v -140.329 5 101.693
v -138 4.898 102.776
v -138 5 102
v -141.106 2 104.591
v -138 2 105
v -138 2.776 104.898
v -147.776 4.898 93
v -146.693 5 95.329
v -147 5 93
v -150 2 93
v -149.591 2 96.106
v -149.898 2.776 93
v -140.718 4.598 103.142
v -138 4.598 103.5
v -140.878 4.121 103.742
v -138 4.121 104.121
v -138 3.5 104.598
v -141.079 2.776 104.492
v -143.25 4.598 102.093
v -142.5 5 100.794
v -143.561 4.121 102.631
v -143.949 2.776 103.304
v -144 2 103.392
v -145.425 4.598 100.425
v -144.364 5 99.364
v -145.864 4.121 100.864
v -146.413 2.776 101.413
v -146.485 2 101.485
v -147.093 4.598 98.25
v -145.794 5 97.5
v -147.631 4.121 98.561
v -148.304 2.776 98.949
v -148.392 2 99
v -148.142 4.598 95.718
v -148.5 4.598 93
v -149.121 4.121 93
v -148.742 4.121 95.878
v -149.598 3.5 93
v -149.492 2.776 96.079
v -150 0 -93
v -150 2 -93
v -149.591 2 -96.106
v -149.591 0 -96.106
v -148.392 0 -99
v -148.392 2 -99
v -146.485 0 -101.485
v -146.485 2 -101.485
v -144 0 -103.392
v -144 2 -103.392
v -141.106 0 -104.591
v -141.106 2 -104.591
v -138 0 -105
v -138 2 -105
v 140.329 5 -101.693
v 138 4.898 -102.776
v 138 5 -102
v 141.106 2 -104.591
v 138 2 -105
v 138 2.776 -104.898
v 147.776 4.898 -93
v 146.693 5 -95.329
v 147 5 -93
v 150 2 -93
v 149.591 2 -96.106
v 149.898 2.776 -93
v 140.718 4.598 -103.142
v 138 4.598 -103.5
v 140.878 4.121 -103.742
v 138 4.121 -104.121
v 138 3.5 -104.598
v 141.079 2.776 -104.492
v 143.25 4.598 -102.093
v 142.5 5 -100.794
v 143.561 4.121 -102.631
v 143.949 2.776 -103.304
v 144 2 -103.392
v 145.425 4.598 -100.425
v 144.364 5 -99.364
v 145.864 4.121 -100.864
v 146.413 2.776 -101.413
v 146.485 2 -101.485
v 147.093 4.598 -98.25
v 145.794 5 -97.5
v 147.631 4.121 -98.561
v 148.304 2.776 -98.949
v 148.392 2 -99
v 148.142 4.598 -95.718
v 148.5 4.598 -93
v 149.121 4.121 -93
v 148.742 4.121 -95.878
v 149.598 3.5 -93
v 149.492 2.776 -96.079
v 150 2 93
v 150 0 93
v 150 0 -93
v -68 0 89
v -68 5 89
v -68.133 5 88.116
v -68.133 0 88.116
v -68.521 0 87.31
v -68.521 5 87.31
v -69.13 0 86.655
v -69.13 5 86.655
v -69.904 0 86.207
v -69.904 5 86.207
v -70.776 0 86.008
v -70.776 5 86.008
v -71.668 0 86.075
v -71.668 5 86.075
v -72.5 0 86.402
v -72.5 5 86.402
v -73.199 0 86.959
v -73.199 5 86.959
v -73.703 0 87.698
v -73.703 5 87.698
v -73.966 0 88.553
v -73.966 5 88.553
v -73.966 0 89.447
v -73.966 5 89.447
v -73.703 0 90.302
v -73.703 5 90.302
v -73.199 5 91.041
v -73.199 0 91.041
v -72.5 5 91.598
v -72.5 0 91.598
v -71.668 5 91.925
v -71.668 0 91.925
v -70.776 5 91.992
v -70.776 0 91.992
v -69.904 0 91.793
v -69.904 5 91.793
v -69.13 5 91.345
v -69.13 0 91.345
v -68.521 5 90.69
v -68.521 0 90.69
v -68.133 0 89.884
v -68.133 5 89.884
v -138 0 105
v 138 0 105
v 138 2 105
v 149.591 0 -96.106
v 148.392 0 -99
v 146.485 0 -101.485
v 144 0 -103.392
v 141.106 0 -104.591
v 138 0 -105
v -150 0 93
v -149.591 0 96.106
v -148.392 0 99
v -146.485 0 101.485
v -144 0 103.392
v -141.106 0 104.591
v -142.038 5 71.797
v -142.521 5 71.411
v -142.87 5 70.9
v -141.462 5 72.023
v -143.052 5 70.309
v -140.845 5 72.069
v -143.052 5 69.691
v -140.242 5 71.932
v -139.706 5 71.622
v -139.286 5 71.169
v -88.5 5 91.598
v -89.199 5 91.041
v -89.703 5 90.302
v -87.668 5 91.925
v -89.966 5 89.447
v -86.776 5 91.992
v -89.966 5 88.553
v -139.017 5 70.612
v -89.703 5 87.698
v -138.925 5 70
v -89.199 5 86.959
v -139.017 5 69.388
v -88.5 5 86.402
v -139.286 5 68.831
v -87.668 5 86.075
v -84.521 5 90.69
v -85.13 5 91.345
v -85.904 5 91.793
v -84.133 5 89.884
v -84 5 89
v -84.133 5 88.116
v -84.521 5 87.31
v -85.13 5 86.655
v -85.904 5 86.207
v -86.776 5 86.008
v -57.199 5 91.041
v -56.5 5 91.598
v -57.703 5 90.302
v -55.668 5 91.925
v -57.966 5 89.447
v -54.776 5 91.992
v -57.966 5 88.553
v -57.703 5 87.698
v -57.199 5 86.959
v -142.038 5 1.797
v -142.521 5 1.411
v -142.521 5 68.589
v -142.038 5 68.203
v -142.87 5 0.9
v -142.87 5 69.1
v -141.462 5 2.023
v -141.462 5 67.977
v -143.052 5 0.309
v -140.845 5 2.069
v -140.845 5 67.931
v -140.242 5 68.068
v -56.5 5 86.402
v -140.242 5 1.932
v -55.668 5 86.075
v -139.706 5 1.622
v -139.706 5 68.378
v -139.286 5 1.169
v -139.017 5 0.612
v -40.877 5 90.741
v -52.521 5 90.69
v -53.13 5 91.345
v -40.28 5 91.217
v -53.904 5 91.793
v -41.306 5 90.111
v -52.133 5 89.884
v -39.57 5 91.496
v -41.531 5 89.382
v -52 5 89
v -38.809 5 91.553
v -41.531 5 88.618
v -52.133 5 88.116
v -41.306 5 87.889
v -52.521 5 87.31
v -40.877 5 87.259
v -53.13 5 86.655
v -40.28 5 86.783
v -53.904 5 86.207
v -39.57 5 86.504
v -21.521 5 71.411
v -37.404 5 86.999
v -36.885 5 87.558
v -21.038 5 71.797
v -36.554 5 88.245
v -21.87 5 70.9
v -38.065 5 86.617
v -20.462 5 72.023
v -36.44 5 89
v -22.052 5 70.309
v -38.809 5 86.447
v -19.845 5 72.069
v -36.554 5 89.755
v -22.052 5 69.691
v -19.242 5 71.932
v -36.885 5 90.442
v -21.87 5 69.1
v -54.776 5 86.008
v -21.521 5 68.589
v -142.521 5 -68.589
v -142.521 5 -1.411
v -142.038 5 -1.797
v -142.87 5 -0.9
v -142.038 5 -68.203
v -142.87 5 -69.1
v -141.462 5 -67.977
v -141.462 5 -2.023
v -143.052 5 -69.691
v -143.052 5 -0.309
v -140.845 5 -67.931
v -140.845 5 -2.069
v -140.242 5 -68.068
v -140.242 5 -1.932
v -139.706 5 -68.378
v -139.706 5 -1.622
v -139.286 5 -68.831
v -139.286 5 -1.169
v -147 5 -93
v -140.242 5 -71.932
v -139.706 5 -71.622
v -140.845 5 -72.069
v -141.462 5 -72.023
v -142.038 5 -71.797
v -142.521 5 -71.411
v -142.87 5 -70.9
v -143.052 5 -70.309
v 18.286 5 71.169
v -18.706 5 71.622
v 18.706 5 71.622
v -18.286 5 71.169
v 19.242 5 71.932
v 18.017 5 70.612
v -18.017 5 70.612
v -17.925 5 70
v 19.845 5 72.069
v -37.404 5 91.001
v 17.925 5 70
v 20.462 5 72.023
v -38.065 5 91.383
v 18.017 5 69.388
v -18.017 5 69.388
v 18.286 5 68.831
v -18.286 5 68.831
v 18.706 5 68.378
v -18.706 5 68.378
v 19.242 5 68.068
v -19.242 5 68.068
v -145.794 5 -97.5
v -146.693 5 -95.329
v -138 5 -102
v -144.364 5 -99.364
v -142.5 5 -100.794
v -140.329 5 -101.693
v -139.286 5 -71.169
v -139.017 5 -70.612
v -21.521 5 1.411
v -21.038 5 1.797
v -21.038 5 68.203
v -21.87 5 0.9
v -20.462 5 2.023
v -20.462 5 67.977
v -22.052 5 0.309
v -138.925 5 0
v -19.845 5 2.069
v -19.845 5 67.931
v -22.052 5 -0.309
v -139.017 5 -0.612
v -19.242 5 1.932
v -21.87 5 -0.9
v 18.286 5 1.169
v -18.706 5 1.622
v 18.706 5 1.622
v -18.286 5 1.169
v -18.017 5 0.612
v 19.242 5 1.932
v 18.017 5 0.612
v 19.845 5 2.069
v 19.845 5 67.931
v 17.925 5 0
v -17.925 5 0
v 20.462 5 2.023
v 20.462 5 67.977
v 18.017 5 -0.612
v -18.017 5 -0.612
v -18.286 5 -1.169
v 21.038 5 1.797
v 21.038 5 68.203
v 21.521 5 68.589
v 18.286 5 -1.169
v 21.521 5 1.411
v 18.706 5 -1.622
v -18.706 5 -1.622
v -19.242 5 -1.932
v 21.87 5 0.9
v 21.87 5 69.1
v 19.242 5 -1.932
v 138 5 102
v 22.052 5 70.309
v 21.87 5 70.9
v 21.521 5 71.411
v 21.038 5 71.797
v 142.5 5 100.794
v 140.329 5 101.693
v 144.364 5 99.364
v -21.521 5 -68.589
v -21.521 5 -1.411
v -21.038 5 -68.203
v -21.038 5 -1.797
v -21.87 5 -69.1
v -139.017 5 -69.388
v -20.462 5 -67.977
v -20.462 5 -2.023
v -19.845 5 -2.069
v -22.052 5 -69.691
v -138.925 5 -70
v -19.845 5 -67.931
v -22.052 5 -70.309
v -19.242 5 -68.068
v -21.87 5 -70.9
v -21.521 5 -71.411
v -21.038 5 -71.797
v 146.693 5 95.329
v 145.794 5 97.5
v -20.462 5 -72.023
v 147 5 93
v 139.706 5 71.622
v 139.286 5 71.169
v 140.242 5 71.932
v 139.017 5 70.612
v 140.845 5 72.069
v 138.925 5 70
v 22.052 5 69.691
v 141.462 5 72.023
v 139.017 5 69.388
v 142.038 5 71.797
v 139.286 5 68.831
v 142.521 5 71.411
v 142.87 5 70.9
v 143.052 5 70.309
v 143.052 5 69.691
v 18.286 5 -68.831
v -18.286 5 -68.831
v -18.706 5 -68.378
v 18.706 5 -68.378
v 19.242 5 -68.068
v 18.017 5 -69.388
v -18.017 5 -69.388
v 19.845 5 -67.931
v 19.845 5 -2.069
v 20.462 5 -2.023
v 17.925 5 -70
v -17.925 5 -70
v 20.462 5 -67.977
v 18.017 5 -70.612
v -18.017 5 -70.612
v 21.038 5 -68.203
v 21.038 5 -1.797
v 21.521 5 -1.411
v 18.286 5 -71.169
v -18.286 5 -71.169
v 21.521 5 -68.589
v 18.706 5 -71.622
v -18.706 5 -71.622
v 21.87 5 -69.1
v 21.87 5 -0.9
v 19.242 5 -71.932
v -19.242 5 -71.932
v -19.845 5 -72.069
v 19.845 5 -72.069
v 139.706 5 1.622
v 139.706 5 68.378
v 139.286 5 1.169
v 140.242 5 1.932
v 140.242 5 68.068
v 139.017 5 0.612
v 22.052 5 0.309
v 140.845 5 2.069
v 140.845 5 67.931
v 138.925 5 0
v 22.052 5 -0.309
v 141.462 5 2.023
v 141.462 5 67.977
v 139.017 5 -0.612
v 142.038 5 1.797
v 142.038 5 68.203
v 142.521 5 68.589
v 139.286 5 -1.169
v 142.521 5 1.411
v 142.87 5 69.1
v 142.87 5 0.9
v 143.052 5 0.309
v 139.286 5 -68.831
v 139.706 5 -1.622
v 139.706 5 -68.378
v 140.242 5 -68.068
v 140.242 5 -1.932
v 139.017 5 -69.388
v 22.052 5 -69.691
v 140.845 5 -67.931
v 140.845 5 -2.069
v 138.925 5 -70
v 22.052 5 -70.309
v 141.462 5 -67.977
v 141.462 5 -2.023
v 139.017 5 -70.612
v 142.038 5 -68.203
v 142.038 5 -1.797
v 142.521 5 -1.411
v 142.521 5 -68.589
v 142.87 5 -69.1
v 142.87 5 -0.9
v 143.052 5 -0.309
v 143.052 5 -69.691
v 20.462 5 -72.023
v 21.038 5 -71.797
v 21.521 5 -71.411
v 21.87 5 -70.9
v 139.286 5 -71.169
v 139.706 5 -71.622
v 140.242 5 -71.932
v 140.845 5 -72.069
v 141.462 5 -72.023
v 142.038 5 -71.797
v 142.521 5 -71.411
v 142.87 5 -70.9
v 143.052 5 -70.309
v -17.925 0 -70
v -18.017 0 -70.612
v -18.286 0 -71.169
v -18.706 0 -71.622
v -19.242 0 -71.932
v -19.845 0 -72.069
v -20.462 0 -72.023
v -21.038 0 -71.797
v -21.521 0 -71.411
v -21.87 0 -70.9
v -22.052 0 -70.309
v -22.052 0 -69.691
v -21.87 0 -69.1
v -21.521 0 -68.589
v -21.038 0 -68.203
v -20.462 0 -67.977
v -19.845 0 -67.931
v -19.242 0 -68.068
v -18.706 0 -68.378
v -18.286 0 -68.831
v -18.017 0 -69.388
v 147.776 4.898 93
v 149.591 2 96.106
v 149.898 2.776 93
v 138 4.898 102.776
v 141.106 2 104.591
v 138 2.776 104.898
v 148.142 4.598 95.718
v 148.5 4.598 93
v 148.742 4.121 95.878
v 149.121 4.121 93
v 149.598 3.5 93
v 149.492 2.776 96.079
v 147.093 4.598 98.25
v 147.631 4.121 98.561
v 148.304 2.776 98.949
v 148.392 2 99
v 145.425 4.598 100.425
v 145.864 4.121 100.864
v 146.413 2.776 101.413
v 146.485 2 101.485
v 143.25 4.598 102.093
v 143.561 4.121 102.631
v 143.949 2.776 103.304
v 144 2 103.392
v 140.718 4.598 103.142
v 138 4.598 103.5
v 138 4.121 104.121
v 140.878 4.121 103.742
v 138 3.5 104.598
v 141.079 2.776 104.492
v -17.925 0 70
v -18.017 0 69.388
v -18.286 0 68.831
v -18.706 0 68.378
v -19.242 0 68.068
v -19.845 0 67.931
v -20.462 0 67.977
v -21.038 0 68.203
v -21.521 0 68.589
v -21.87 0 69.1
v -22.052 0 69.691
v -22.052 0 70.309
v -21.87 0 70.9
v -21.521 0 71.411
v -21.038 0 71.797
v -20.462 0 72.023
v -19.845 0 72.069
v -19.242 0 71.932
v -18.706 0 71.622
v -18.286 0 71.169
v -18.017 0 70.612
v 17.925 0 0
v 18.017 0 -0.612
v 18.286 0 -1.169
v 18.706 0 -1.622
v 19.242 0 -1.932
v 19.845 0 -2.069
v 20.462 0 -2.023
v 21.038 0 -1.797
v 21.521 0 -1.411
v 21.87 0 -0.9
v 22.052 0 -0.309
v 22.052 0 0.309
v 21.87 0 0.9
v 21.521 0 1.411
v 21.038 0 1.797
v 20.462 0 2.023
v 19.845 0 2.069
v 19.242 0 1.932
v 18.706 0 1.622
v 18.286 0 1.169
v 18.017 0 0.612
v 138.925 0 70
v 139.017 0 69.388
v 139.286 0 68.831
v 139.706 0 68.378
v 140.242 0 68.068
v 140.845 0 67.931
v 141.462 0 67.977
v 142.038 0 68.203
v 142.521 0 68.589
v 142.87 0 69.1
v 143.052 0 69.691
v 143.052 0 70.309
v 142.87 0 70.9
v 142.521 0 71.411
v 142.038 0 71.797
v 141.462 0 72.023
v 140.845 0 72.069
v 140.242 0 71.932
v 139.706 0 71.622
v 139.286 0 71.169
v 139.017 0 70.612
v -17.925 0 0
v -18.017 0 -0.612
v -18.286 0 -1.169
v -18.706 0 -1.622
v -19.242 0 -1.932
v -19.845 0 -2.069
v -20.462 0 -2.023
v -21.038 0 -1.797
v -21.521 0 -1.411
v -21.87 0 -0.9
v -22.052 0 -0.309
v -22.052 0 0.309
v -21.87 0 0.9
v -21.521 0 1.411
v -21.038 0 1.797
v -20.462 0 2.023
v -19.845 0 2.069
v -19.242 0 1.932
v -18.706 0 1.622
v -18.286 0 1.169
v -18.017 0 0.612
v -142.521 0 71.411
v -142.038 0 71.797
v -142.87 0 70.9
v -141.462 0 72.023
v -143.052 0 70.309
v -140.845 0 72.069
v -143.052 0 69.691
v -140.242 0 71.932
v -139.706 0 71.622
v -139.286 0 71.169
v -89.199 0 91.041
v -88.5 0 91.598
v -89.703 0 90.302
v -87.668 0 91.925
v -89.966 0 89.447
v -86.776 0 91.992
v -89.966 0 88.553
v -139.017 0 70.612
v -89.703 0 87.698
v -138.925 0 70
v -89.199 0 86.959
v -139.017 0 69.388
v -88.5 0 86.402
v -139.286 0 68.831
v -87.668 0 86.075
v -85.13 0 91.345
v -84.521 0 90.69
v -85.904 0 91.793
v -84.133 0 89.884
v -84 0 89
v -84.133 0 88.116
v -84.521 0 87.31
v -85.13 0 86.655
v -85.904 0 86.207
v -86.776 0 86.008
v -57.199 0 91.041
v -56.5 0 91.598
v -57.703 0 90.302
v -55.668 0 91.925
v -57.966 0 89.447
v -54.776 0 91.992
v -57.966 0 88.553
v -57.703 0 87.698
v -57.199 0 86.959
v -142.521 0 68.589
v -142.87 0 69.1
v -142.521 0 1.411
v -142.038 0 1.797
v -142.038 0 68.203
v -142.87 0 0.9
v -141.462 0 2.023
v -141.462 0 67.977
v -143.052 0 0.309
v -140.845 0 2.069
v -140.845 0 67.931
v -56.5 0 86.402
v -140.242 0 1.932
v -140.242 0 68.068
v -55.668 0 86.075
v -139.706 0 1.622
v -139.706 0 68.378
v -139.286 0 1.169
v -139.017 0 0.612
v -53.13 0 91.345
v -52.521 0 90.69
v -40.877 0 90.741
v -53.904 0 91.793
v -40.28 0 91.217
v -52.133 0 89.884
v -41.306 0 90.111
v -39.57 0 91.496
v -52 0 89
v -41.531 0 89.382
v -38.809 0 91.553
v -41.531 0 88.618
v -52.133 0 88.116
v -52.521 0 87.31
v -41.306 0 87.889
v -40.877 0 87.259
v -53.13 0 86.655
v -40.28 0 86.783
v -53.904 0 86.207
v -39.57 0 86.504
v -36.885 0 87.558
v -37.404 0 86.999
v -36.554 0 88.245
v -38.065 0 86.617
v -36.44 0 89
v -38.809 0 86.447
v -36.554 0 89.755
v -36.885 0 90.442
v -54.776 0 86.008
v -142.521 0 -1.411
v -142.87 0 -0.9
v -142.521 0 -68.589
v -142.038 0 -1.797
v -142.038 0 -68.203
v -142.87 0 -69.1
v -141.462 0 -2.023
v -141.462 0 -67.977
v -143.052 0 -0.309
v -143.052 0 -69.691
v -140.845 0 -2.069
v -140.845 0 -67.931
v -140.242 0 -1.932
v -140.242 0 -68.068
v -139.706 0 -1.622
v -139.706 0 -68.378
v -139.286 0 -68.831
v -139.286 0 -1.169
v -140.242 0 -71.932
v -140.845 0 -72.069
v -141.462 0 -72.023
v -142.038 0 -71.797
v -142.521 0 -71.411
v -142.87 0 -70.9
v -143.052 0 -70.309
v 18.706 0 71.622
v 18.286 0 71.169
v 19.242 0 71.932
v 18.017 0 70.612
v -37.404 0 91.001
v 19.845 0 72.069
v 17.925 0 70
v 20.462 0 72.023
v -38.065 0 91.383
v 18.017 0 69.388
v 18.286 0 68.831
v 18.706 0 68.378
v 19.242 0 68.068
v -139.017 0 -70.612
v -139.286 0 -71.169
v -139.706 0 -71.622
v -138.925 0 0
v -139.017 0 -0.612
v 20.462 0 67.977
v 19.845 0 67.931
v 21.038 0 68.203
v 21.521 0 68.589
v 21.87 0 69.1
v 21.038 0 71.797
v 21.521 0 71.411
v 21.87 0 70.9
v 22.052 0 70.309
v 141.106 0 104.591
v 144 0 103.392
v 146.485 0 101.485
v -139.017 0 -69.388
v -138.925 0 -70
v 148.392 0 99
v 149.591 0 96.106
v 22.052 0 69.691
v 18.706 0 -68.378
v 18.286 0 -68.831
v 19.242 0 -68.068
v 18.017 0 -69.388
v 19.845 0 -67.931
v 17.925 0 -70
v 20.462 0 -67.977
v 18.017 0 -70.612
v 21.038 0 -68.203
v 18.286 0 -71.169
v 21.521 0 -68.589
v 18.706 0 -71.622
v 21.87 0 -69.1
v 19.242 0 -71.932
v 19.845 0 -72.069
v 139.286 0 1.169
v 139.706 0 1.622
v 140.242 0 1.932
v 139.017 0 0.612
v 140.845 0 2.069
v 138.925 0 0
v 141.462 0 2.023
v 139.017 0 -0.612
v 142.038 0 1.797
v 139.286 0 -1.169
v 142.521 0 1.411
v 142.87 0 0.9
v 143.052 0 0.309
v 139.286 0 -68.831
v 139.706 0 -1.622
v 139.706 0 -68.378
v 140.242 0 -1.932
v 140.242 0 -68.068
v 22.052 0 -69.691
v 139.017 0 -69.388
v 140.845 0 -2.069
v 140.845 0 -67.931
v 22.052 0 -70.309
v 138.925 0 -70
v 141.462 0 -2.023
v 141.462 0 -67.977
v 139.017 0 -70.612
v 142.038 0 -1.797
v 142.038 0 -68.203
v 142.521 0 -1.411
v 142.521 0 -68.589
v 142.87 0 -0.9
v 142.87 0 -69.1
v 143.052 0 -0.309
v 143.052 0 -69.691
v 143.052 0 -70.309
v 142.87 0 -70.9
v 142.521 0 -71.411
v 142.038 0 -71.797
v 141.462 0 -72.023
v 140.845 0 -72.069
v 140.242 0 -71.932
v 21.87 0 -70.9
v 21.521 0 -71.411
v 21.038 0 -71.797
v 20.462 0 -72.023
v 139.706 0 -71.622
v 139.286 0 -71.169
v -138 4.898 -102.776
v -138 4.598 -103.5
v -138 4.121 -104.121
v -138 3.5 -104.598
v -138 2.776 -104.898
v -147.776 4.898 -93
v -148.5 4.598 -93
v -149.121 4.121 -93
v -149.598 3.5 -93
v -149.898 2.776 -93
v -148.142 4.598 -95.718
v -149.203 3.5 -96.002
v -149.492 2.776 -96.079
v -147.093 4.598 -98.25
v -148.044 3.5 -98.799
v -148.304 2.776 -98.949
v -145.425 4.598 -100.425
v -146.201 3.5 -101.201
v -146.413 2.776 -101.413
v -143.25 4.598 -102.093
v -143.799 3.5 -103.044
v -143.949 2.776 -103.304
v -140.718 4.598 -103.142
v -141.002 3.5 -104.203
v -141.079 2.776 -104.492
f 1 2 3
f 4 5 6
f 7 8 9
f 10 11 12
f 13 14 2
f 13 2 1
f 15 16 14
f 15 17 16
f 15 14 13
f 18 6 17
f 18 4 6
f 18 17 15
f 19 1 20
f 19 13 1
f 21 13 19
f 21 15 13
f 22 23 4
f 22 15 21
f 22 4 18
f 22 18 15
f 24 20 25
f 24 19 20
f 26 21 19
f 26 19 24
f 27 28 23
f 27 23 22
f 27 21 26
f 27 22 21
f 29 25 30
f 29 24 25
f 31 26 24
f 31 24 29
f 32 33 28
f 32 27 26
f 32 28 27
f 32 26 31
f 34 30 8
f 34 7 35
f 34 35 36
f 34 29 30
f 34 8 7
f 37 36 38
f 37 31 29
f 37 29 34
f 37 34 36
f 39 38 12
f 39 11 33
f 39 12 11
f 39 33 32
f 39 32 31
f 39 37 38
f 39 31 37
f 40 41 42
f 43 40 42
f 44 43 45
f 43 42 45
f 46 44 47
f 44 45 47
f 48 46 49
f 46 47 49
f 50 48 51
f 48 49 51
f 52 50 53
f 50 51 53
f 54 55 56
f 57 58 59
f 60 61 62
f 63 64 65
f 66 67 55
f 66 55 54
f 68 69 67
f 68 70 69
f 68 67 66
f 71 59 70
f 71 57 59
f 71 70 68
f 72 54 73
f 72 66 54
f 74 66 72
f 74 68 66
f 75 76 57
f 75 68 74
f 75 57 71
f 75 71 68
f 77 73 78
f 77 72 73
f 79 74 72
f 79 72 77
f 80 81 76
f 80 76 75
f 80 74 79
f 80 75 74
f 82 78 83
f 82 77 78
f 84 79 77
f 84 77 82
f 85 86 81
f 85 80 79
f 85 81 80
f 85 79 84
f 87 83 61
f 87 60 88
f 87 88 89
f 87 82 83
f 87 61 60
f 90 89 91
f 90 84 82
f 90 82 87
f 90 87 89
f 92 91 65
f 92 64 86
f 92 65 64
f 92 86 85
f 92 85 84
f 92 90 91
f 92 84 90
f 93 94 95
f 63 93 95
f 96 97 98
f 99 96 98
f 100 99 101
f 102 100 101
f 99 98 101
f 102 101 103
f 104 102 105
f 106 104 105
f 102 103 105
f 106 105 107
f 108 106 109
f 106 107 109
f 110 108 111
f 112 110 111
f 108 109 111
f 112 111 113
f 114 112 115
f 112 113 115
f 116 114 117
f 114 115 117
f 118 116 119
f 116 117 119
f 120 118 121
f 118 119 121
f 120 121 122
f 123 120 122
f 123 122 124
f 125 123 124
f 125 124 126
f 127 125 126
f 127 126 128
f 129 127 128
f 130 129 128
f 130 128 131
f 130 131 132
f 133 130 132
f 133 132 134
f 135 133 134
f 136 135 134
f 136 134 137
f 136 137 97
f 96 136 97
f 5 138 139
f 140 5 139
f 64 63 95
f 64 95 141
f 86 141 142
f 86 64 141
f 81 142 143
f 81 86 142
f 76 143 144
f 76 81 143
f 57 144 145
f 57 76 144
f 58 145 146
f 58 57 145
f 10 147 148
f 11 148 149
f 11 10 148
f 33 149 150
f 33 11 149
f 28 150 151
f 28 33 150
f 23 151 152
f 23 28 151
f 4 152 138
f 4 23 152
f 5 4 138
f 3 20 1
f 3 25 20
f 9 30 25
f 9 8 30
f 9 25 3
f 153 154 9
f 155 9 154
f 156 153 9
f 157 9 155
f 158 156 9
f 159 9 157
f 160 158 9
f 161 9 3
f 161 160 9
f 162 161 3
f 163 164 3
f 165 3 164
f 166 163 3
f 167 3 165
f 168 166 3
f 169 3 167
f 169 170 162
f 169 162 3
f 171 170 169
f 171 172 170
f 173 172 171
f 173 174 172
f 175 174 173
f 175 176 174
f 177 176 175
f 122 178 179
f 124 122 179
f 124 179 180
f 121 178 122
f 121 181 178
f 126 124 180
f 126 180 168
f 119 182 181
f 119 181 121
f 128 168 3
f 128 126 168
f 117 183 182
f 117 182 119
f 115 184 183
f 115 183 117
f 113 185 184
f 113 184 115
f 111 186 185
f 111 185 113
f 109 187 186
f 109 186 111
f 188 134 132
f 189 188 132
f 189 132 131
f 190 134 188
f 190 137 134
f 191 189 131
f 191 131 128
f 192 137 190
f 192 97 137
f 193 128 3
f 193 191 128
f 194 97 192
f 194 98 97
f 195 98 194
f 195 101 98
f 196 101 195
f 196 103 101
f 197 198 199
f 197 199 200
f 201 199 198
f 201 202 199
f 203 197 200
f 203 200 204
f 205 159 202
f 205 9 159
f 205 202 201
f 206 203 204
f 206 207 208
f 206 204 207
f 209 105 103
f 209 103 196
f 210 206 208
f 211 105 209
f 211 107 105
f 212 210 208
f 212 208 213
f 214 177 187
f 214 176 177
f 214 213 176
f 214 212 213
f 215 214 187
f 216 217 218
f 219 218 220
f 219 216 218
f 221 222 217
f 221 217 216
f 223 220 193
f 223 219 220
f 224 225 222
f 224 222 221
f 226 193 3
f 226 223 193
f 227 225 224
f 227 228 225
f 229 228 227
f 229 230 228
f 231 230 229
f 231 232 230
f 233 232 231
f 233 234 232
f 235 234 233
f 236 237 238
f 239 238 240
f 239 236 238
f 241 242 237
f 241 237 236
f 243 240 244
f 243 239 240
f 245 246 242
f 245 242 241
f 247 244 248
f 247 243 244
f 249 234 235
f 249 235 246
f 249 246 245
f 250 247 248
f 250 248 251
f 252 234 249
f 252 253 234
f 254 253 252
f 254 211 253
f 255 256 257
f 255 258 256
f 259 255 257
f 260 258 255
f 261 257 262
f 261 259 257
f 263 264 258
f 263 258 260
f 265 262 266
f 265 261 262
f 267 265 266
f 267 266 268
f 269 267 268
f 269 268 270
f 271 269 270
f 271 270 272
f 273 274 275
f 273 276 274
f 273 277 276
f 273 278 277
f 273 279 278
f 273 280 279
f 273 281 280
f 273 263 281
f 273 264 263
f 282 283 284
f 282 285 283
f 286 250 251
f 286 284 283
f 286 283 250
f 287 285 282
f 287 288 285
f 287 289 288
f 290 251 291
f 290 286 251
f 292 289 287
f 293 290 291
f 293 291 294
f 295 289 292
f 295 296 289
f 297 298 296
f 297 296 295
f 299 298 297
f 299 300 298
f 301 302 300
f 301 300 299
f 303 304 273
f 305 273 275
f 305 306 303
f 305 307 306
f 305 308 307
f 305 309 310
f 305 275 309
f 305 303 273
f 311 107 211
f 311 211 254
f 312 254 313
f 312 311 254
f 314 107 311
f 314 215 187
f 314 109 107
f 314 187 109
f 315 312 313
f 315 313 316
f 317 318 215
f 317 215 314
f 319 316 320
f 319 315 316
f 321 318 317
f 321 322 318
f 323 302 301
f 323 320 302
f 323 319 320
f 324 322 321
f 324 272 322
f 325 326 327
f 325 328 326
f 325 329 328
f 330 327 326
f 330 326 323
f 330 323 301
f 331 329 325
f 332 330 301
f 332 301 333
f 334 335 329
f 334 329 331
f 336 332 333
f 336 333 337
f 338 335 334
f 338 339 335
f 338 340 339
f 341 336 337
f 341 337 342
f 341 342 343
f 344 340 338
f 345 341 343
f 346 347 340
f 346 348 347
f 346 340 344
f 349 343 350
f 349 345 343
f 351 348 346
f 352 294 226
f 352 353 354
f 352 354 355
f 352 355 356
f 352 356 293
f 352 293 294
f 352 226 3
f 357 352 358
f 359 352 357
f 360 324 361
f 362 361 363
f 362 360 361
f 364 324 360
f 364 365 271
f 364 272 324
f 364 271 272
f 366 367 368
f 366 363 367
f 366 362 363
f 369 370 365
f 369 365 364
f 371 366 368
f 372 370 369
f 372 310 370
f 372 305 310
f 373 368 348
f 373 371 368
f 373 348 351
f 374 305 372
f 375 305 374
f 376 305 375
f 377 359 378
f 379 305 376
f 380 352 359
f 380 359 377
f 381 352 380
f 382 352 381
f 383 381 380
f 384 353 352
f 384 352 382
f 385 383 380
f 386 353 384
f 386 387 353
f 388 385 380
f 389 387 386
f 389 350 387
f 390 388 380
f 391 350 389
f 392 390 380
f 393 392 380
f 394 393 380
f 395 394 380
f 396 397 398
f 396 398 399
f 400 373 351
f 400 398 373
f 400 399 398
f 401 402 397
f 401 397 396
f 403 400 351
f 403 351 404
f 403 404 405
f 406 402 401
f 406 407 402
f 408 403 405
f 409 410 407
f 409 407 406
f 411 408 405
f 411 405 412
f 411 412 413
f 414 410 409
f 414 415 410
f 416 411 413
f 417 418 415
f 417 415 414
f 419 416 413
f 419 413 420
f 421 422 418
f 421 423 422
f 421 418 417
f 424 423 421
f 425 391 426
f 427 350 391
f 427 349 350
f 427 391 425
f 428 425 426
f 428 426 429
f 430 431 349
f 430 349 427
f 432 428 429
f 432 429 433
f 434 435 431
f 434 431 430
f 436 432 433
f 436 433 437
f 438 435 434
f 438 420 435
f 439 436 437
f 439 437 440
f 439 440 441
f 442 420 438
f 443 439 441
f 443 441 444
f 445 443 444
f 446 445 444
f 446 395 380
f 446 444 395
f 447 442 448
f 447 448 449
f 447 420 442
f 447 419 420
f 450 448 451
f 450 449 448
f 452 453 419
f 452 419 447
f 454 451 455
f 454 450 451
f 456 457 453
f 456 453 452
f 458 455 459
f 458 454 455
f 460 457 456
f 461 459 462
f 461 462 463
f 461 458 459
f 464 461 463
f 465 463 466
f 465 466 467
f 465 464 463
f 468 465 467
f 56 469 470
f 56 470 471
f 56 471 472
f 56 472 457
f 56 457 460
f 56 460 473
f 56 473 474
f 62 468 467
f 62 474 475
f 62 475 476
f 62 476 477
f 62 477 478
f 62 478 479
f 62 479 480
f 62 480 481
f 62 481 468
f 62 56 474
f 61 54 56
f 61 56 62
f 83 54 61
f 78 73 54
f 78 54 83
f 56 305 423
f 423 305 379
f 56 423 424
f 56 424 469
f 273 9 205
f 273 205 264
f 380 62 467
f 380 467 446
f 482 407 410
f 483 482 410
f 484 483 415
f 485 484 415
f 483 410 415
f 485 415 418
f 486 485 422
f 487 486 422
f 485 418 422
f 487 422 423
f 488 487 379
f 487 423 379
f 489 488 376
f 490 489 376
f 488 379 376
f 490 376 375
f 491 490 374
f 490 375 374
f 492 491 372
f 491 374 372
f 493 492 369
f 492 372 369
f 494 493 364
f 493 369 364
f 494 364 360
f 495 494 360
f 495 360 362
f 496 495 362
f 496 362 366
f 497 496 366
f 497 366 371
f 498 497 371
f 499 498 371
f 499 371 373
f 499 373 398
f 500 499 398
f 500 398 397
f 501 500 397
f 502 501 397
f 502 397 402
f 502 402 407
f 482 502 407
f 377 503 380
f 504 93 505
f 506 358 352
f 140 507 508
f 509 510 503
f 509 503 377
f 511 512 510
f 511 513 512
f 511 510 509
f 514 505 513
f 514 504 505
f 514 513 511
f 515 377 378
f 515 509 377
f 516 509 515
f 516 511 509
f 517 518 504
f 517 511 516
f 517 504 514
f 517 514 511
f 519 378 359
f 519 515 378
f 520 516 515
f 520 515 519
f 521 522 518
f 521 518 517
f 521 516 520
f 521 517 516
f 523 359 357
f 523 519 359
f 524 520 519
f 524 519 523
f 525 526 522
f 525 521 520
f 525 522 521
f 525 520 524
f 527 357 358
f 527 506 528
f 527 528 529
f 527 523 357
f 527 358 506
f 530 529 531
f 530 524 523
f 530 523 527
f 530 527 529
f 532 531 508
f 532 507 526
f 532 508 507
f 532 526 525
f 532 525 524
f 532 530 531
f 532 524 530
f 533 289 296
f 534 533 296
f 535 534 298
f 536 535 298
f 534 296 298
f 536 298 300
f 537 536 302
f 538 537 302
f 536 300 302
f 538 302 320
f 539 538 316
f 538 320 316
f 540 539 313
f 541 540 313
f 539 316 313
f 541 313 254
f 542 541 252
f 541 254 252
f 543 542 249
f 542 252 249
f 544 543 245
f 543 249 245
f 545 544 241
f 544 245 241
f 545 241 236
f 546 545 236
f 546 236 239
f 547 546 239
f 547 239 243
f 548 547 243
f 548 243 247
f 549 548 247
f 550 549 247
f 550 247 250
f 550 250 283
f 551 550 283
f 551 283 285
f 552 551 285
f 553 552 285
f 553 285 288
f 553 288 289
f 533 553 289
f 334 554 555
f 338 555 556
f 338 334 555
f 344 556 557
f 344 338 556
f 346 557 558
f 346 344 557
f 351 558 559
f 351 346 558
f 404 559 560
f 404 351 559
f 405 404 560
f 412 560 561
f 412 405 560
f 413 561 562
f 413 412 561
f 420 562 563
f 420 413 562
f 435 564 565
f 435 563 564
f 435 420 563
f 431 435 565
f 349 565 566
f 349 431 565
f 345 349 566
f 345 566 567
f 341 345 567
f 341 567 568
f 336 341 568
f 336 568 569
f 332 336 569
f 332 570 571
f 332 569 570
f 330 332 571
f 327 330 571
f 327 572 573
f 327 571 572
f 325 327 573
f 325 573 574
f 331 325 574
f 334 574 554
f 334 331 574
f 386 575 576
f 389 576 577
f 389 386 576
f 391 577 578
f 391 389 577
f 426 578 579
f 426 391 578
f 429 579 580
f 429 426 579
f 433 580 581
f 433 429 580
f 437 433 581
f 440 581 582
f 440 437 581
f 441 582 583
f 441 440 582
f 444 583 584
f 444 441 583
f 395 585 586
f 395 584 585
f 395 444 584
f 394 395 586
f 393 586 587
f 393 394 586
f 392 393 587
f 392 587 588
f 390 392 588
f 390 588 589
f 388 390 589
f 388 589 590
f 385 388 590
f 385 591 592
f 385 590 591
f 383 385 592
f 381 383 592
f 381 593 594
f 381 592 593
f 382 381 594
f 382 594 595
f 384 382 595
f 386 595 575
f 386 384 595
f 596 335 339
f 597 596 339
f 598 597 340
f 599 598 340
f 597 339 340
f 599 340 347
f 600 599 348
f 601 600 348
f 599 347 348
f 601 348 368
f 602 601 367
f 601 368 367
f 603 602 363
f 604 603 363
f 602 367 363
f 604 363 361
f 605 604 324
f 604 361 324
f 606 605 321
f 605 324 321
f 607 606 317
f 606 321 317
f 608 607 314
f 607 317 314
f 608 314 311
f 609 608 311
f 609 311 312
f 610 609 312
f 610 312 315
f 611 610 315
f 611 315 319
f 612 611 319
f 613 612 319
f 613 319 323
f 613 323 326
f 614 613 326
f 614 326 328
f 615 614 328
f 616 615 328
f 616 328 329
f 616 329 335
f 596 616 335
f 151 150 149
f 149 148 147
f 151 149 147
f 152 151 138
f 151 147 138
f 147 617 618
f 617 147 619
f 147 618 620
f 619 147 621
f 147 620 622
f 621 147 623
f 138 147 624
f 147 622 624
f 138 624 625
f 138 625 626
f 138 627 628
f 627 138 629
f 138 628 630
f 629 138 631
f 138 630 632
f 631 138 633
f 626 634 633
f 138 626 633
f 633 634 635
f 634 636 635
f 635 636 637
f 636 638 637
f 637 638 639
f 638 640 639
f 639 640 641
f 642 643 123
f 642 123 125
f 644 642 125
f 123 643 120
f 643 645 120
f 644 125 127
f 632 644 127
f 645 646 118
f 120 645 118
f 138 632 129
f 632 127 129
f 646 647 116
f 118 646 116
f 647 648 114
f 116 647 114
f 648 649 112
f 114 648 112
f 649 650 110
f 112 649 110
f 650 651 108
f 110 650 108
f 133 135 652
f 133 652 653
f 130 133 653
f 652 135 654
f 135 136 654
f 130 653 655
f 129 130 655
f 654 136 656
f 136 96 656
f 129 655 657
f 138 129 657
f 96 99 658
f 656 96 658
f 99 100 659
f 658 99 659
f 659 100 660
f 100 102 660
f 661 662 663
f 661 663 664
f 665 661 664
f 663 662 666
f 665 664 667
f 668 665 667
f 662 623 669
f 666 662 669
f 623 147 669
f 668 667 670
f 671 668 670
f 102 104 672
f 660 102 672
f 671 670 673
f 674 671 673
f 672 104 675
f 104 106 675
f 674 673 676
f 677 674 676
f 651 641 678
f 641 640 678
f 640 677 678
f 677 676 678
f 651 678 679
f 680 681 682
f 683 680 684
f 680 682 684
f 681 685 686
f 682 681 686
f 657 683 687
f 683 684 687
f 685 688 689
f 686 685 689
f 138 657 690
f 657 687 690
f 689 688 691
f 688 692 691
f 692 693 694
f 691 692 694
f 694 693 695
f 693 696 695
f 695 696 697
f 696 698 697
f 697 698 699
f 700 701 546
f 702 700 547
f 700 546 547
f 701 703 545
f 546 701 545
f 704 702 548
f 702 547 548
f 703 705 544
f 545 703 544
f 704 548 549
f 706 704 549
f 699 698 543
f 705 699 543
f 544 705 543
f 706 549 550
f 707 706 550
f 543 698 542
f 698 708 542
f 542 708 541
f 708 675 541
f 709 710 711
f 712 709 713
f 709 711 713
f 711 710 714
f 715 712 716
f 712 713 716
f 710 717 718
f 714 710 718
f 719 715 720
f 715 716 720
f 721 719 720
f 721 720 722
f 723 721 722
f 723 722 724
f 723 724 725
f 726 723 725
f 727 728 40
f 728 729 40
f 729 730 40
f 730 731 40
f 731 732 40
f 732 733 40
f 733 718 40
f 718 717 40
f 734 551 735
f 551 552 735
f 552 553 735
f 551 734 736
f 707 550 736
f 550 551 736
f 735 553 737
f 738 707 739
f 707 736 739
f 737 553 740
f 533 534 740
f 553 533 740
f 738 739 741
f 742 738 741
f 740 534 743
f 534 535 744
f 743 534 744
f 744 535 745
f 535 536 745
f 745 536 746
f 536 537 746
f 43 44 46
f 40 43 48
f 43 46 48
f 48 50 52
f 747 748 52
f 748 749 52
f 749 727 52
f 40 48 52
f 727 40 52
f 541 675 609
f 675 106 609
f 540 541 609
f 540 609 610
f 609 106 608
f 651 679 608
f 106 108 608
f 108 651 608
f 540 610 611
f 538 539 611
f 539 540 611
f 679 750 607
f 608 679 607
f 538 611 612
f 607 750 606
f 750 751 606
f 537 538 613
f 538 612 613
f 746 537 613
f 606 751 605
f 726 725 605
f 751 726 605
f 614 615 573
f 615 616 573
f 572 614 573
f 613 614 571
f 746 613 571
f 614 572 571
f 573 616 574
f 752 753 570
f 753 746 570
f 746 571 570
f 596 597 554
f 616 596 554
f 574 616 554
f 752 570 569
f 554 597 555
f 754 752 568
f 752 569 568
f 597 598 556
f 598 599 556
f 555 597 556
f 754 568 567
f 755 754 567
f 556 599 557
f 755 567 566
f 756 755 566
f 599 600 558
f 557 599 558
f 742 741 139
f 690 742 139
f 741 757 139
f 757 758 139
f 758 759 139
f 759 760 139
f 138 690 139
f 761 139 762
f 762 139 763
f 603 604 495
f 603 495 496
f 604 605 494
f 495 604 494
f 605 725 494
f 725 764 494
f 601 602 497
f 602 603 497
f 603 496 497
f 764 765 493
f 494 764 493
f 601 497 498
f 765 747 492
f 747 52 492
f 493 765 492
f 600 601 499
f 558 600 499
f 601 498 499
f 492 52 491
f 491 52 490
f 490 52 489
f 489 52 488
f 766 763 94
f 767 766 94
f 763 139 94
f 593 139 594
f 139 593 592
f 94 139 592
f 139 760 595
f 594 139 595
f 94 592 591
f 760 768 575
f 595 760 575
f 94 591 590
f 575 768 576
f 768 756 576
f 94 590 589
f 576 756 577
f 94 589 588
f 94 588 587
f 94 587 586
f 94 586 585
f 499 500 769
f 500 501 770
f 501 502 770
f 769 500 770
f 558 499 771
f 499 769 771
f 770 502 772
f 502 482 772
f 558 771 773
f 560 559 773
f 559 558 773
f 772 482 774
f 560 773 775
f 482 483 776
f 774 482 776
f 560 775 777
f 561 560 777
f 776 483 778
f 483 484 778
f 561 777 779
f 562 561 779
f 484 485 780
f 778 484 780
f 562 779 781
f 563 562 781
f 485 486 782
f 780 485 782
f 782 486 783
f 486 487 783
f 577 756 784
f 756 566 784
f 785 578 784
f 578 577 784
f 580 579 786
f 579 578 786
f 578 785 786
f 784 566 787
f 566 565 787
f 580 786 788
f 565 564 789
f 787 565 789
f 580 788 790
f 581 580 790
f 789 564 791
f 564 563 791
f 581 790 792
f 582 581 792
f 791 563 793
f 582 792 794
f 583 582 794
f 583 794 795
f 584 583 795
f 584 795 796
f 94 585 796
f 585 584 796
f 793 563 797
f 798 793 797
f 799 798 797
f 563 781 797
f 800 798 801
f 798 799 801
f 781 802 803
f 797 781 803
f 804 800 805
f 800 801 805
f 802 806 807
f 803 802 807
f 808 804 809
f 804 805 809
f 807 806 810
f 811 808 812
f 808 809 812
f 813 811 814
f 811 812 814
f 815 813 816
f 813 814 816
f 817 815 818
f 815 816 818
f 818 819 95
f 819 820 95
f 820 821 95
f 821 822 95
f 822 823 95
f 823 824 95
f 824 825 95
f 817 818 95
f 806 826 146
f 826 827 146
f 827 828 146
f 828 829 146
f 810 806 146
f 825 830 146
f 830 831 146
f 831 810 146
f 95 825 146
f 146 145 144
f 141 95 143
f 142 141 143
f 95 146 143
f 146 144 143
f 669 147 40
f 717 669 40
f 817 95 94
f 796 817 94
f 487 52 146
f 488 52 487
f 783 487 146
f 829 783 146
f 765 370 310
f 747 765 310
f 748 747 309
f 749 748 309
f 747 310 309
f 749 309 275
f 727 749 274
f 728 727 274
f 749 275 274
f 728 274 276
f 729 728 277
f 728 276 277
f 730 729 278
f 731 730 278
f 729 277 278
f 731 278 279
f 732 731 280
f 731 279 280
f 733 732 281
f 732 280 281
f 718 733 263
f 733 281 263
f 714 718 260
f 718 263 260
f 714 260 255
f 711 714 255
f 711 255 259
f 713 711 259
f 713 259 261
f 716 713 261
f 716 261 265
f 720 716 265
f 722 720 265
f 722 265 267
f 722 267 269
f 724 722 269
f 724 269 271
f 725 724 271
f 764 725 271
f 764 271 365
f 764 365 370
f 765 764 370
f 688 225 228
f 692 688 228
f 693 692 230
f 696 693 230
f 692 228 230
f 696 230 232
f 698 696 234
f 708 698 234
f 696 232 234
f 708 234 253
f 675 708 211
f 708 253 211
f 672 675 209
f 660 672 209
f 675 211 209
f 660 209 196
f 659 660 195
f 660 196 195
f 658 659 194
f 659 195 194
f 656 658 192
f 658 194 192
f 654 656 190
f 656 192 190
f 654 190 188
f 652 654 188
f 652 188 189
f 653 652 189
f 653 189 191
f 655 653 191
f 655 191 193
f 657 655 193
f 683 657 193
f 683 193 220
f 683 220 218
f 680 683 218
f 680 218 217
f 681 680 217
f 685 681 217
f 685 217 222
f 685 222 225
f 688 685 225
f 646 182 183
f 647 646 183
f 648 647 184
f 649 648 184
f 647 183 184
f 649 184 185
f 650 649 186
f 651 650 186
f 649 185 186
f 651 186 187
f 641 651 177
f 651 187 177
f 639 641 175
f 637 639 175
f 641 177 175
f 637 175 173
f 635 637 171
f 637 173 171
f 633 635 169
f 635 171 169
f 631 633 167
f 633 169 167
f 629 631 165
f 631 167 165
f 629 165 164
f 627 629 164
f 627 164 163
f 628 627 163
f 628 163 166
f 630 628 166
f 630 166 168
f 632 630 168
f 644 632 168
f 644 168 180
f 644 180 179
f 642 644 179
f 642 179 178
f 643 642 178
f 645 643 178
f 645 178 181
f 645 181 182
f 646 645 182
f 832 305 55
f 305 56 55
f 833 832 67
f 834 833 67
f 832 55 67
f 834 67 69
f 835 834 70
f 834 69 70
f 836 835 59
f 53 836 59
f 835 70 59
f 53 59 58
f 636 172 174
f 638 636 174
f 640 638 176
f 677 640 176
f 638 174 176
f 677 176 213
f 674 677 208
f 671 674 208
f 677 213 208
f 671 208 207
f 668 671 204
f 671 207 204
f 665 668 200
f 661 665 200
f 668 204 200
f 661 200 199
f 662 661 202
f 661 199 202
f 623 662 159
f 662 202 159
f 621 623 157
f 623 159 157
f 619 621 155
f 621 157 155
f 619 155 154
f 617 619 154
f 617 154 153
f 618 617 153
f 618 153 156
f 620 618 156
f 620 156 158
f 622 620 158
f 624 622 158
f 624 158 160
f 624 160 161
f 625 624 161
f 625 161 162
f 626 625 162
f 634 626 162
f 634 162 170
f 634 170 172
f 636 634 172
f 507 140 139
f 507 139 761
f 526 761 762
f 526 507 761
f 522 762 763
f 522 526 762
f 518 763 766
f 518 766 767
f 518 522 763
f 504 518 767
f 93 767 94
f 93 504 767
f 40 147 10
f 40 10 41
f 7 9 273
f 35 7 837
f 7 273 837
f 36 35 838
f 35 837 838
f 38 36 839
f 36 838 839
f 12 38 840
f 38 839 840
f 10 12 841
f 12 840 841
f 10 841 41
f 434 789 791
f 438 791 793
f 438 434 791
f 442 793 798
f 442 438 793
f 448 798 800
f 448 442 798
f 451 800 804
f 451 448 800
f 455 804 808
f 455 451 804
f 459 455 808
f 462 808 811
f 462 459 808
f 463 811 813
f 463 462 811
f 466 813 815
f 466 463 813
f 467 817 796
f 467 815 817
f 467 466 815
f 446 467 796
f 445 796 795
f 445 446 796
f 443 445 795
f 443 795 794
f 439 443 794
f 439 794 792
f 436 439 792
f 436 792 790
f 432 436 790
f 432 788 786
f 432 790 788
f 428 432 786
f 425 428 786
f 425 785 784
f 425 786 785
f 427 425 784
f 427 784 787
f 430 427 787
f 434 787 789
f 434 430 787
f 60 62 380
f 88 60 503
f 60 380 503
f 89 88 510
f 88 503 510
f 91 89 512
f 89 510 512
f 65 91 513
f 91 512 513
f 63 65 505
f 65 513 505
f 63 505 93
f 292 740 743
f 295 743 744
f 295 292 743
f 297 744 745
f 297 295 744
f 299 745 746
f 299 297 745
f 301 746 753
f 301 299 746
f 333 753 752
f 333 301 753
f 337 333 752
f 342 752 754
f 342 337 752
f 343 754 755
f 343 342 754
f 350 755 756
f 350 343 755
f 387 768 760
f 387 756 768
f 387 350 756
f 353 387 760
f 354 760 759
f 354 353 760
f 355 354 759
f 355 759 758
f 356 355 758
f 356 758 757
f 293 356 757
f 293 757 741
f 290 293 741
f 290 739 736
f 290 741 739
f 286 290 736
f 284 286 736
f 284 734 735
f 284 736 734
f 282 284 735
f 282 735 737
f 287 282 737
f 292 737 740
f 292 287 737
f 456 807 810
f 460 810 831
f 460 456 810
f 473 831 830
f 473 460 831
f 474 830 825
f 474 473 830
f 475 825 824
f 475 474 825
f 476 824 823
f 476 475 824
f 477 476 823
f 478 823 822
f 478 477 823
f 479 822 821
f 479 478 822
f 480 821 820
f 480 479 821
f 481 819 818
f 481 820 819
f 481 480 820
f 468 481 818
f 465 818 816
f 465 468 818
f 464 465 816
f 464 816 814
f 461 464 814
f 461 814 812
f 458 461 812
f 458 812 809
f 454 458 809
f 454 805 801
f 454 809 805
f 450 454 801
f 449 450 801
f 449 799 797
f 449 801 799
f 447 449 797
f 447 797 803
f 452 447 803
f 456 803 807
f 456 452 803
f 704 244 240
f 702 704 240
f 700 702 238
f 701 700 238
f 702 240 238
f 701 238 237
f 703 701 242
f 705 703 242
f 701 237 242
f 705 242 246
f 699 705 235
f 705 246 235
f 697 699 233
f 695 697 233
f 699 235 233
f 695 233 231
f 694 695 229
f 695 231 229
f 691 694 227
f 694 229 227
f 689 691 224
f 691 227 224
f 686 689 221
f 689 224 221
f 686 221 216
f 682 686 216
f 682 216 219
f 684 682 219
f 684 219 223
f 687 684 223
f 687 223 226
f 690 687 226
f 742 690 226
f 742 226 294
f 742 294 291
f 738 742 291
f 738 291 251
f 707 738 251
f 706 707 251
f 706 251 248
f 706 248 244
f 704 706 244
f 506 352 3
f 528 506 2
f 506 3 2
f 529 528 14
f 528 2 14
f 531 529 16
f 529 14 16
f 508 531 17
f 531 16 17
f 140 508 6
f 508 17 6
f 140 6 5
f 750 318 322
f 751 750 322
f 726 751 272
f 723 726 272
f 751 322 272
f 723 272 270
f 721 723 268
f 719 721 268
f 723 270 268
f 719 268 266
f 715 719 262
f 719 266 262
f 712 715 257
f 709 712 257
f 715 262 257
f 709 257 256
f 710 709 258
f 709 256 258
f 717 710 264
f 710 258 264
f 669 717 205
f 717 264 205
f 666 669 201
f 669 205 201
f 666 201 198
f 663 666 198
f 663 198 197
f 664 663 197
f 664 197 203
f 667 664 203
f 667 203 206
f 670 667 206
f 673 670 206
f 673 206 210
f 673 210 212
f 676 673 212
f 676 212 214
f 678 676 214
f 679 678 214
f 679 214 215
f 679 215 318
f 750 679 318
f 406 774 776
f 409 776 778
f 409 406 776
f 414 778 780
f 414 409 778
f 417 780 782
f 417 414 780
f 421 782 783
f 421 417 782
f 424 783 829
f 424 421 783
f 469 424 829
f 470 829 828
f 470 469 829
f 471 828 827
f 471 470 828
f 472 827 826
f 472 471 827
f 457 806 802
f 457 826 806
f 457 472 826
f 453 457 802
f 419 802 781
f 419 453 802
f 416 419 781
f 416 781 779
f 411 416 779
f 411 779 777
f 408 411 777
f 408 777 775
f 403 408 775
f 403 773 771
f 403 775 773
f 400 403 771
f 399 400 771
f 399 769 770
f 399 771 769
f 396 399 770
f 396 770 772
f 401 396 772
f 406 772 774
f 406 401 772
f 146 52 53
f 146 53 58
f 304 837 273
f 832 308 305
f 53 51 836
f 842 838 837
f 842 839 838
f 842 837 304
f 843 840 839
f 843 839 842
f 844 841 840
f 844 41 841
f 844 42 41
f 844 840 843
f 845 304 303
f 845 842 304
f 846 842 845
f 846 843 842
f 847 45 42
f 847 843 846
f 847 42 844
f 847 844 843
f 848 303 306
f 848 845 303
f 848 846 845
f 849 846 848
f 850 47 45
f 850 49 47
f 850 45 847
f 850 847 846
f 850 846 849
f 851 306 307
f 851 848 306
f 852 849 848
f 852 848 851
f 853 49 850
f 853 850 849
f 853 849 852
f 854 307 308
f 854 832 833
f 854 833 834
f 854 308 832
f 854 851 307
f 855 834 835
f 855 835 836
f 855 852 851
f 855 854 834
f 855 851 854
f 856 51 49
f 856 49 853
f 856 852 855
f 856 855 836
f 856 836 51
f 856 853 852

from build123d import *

# Parameters (mm, degrees)
SKETCH1_W           = 300
SKETCH1_H           = 210
BOSS_EXTRUDE1_DEPTH = 5
FILLET1_R           = 12
SKETCH2_R           = 2.075
CUT_EXTRUDE1_DEPTH  = 6
FILLET2_R           = 3
SKETCH3_R           = 3
SKETCH3_R_2         = 2.56
CUT_EXTRUDE2_DEPTH  = 6


with BuildPart() as part:
    # Sketch1 → Boss-Extrude1 (new body)
    with BuildSketch(Plane(origin=(0, 0, 0), x_dir=(1, 0, 0), z_dir=(0, 1, 0))):
        Rectangle(SKETCH1_W, SKETCH1_H)
    extrude(amount=BOSS_EXTRUDE1_DEPTH)

    # Fillet1
    fillet1_edges = [part.edges().sort_by_distance(p)[0] for p in [
        (150, 2.5, 105),
        (-150, 2.5, 105),
        (-150, 2.5, -105),
        (150, 2.5, -105),
    ]]
    fillet(fillet1_edges, radius=FILLET1_R)

    # Sketch2 → Cut-Extrude1 (cut, through all)
    with BuildSketch(Plane(origin=(0, 5, 0), x_dir=(1, 0, 0), z_dir=(0, 1, 0))):
        with Locations((-141, 70)):
            Circle(SKETCH2_R)
        with Locations((-141, 0)):
            Circle(SKETCH2_R)
        with Locations((-141, -70)):
            Circle(SKETCH2_R)
        with Locations((-20, 70)):
            Circle(SKETCH2_R)
        with Locations((-20, 0)):
            Circle(SKETCH2_R)
        with Locations((-20, -70)):
            Circle(SKETCH2_R)
    cut_extrude1 = extrude(amount=-CUT_EXTRUDE1_DEPTH, mode=Mode.SUBTRACT)

    # Mirror1: Cut-Extrude1 across plane
    add(cut_extrude1.mirror(Plane(origin=(0, 0, 0), x_dir=(0, 0, 1), z_dir=(1, 0, 0))), mode=Mode.SUBTRACT)

    # Fillet2
    fillet2_edges = [part.edges().sort_by_distance(p)[0] for p in [
        (0, 5, -105),
        (150, 5, 0),
        (-150, 5, 0),
        (0, 5, 105),
        (-146.485281374, 5, -101.485281374),
        (-146.485281374, 5, 101.485281374),
        (146.485281374, 5, 101.485281374),
        (146.485281374, 5, -101.485281374),
    ]]
    fillet(fillet2_edges, radius=FILLET2_R)

    # Sketch3 → Cut-Extrude2 (cut, through all)
    with BuildSketch(Plane(origin=(0, 5, 0), x_dir=(1, 0, 0), z_dir=(0, 1, 0))):
        with Locations((-87, -89)):
            Circle(SKETCH3_R)
        with Locations((-71, -89)):
            Circle(SKETCH3_R)
        with Locations((-55, -89)):
            Circle(SKETCH3_R)
        with Locations((-39, -89)):
            Circle(SKETCH3_R_2)
    extrude(amount=-CUT_EXTRUDE2_DEPTH, mode=Mode.SUBTRACT)


solid = part.part
